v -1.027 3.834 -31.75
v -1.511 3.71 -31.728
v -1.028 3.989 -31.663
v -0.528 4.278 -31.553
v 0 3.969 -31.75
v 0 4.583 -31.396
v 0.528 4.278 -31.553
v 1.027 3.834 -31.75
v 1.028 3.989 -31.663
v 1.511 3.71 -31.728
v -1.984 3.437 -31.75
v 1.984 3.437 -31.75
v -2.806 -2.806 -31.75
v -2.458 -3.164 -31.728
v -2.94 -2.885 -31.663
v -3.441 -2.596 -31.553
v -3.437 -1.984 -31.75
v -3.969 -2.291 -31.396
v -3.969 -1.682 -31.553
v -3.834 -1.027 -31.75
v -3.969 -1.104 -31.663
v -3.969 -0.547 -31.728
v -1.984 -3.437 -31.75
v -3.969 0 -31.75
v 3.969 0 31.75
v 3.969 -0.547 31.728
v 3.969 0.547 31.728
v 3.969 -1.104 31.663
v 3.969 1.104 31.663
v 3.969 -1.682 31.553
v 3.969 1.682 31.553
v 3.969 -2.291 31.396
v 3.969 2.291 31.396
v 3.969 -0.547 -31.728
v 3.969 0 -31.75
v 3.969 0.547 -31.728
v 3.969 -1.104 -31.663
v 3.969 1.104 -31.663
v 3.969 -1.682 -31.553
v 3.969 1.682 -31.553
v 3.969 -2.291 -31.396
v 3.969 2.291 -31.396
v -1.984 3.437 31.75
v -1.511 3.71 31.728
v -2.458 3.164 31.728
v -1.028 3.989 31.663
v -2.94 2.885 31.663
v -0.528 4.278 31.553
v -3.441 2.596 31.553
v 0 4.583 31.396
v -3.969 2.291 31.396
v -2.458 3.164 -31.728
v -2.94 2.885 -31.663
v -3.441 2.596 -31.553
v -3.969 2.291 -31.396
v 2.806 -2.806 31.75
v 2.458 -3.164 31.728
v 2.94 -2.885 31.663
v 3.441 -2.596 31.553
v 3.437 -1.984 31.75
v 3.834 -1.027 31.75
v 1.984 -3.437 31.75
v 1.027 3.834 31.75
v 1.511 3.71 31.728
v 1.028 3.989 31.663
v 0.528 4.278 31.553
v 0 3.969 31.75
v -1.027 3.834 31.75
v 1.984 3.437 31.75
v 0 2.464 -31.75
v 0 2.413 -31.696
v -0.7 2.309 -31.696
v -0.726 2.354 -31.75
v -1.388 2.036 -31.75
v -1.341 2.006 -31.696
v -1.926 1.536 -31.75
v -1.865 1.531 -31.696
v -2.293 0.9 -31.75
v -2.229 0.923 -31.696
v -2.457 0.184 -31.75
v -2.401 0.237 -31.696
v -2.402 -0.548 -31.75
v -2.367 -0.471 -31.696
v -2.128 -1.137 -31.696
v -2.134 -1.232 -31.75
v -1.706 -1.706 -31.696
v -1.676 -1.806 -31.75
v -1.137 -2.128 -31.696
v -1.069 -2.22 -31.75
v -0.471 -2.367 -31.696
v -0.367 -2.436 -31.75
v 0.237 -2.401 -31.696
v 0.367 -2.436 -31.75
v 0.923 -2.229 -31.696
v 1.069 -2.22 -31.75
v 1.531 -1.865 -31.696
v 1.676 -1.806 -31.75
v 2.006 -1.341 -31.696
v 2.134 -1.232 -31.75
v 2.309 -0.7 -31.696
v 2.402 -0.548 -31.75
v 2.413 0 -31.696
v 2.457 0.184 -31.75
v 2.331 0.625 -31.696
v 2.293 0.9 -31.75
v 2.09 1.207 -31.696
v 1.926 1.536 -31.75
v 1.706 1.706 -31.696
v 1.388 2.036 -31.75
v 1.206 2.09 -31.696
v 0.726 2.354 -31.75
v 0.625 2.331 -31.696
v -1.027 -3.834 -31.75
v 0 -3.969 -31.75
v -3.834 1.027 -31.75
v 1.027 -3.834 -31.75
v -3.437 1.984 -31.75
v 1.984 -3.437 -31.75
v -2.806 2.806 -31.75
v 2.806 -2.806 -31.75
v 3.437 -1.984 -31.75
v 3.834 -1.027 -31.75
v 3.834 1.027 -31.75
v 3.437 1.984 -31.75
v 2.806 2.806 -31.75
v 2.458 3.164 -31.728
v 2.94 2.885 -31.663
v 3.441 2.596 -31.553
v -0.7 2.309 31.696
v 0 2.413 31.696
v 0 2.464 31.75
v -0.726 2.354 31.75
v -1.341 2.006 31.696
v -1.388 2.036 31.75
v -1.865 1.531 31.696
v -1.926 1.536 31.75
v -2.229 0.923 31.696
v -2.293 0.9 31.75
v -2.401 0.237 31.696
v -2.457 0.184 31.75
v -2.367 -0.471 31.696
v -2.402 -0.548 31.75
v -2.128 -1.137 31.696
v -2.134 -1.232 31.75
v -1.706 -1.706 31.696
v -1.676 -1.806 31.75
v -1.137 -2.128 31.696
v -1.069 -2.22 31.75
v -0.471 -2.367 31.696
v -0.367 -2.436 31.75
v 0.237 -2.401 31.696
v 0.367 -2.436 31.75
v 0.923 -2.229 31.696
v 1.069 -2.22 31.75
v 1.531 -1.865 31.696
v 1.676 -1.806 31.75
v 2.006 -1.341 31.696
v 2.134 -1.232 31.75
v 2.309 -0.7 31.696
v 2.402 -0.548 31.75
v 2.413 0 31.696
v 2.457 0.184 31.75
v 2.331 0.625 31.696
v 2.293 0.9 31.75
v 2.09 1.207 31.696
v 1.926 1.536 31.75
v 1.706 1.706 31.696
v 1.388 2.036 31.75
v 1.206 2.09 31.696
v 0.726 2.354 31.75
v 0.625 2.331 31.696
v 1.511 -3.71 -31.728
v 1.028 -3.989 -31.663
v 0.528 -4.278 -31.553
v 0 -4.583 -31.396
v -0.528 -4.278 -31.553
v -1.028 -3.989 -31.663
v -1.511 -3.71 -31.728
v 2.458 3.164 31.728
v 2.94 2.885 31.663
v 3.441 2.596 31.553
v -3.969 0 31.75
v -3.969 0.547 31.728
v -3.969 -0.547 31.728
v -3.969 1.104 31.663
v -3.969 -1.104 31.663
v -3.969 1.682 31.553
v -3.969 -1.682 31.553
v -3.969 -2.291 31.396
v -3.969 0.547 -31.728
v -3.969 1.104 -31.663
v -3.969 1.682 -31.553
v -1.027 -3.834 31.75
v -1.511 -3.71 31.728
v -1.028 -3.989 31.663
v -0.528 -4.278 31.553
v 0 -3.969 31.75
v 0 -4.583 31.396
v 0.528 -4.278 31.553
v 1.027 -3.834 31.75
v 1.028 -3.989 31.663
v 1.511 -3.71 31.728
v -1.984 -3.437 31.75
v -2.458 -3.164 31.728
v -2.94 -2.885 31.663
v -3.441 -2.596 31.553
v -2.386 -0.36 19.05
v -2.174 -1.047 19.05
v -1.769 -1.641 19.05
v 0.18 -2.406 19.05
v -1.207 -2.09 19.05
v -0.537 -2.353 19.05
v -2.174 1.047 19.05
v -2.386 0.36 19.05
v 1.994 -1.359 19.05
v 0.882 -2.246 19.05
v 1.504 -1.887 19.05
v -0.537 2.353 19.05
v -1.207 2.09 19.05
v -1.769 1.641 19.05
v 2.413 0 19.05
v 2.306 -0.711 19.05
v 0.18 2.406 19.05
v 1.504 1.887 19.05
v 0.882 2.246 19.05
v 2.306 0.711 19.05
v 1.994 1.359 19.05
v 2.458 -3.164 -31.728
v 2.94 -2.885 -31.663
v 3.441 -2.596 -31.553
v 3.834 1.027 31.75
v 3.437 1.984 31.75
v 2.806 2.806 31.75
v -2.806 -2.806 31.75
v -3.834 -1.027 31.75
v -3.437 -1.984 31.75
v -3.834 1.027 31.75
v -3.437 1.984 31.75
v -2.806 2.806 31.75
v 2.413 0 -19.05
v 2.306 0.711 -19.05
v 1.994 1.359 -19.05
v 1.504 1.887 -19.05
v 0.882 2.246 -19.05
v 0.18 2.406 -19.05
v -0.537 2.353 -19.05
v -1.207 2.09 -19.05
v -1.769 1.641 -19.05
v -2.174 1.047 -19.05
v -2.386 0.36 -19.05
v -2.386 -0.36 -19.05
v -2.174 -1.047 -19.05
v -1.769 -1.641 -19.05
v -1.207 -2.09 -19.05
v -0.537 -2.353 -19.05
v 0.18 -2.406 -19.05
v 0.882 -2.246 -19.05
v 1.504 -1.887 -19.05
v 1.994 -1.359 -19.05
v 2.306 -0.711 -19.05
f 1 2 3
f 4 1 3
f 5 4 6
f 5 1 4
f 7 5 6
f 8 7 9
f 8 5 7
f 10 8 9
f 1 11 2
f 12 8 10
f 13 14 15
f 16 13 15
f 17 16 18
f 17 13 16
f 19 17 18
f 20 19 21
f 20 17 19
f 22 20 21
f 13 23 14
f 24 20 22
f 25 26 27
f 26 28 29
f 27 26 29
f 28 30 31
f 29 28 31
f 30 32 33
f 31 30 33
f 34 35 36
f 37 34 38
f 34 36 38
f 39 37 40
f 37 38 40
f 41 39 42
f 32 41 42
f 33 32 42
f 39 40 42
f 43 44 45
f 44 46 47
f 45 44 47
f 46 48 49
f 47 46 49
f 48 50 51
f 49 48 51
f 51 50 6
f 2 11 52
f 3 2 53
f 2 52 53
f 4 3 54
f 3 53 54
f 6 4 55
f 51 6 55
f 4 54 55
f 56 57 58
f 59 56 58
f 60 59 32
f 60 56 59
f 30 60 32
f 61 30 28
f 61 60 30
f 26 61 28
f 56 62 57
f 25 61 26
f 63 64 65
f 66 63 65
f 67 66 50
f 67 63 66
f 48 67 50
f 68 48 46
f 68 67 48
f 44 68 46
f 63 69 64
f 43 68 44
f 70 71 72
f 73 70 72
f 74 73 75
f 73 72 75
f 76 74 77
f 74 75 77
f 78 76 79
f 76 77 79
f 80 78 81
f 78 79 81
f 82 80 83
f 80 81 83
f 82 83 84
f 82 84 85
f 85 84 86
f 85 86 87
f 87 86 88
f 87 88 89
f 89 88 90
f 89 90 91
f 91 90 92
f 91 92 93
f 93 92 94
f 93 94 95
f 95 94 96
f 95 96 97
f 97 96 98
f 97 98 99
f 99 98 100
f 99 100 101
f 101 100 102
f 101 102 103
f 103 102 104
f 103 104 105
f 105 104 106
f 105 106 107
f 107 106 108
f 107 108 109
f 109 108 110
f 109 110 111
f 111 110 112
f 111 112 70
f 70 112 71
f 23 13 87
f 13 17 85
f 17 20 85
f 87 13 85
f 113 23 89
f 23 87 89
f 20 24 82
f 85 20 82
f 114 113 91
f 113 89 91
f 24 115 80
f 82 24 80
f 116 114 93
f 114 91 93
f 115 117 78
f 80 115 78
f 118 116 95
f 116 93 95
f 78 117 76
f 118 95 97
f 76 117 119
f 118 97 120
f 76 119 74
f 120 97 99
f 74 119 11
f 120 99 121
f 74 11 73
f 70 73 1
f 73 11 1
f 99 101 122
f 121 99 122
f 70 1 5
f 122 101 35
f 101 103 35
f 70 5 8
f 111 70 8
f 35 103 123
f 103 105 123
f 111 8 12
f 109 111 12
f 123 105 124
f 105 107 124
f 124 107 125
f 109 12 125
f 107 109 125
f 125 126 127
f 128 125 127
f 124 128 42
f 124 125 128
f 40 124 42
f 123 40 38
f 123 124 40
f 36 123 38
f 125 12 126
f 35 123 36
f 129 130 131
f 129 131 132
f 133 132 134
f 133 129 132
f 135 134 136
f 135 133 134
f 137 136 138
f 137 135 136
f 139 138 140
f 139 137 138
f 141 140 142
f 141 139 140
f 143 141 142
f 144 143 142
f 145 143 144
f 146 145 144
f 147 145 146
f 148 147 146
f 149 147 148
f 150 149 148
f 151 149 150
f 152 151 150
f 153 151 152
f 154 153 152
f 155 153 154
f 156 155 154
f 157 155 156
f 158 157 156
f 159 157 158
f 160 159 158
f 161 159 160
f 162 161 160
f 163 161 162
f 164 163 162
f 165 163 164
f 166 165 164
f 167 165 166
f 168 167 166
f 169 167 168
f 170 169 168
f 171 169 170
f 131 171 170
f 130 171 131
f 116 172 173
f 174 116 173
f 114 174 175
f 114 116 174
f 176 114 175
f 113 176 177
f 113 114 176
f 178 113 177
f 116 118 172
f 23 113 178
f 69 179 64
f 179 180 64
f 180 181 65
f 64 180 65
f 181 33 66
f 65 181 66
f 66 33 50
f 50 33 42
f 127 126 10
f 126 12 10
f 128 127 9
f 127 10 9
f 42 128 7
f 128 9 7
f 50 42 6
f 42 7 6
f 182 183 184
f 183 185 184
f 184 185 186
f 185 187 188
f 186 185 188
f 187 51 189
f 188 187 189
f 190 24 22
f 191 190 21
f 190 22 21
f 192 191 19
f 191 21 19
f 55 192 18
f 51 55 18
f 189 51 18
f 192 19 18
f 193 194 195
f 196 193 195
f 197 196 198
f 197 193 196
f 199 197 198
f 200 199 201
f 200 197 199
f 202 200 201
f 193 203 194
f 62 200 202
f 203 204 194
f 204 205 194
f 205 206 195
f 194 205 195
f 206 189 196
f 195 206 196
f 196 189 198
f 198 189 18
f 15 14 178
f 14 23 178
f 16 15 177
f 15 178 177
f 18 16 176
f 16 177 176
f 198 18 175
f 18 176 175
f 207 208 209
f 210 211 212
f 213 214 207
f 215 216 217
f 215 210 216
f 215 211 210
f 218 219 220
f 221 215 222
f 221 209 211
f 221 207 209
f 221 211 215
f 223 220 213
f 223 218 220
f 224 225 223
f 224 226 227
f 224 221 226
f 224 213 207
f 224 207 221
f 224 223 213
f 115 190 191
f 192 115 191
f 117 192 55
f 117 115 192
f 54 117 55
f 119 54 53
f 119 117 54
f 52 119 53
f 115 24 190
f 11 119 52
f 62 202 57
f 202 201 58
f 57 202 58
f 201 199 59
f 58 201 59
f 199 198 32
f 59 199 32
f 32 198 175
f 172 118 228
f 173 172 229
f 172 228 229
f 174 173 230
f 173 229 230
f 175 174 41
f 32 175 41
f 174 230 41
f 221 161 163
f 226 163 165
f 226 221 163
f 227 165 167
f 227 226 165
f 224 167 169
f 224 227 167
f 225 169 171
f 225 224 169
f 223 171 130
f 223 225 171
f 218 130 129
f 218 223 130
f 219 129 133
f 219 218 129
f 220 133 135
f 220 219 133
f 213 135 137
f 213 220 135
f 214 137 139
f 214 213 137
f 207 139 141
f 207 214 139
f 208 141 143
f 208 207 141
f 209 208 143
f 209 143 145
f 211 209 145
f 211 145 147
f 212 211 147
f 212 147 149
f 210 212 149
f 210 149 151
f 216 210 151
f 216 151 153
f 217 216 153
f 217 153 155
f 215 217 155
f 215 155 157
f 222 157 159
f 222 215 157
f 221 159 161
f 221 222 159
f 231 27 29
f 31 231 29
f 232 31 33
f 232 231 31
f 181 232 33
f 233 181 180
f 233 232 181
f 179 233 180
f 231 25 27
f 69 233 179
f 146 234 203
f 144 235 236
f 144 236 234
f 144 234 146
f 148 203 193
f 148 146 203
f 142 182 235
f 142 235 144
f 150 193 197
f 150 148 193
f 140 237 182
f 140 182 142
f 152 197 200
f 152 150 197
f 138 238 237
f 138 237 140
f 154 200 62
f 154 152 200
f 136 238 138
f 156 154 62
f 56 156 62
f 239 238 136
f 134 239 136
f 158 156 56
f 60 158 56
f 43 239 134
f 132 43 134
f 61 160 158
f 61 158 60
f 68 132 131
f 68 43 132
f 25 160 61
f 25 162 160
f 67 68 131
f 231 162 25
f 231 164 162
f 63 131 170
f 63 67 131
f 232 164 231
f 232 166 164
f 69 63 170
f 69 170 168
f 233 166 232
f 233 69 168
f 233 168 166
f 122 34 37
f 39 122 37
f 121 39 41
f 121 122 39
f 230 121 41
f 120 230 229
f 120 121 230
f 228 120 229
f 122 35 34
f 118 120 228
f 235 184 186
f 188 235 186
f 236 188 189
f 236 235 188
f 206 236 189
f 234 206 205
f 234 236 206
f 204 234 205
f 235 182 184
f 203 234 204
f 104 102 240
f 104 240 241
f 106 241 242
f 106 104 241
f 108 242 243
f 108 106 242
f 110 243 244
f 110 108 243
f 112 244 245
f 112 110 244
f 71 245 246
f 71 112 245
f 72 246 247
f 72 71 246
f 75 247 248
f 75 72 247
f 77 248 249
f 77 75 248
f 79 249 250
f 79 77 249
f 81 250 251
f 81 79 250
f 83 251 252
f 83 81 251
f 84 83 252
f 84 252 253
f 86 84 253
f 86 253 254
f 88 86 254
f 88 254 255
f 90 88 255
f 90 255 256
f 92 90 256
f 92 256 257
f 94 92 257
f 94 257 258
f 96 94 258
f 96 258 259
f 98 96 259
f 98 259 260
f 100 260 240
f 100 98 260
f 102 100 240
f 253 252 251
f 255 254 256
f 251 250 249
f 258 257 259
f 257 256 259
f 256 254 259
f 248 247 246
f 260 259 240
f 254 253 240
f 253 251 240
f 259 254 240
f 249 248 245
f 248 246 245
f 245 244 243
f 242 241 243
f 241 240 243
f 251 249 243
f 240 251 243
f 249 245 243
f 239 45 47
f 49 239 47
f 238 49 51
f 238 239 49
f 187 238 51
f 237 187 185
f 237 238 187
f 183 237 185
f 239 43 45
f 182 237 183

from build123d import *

# Parameters (mm, degrees)
EXTRUDE1_DEPTH          = 31.75
EXTRUDE1_DEPTH_BACK     = 31.75
SKETCH1_R               = 2.413
SKETCH8_OUTSIDE_W       = 247.302
SKETCH8_OUTSIDE_H       = 248.53
SKETCH8_OUTSIDE_R       = 3.96875
EXTRUDE4_DEPTH          = 64.788731596
EXTRUDE4_DRAFT          = -60
MIRROR1_COPY_1_SKETCH_W = 247.302
MIRROR1_COPY_1_SKETCH_H = 248.53
MIRROR1_COPY_1_SKETCH_R = 3.96875
MIRROR1_COPY_1_DEPTH    = 64.788731596
MIRROR1_COPY_1_DRAFT    = -60
SKETCH9_W               = 38.1
SKETCH9_H               = 2.4638


with BuildPart() as part:
    # Sketch1 → Extrude1 (new, two sides: drawn at the far end of the back side and taken through both)
    with BuildSketch(Plane.XY.offset(-EXTRUDE1_DEPTH_BACK)):
        Polygon((0, 4.582717762), (-3.96875, 2.291358881), (-3.96875, -2.291358881), (0, -4.582717762), (3.96875, -2.291358881), (3.96875, 2.291358881), align=None)
        Circle(SKETCH1_R, mode=Mode.SUBTRACT)
    extrude(amount=EXTRUDE1_DEPTH + EXTRUDE1_DEPTH_BACK)

    # Extrude3 cone 1 section (through the dimple's axis) → Extrude3 (revolve, cut)
    with BuildSketch(Plane(origin=(0, 0, -31.75), x_dir=(0, 1, 0), z_dir=(1, 0, 0))):
        Polygon((0, 0), (2.4638, 0), (0, 2.642102028), align=None)
    extrude3 = revolve(axis=Axis((0, 0, -31.75), (0, 0, 1)), mode=Mode.SUBTRACT)


with BuildPart() as extrude4_tool:
    # Sketch8 outside → Extrude4 (with draft: the straight prism first)
    with BuildSketch(Plane(origin=(0, 0, -31.75), x_dir=(-1, 0, 0), z_dir=(0, 0, -1))):
        Rectangle(SKETCH8_OUTSIDE_W, SKETCH8_OUTSIDE_H)
        Circle(SKETCH8_OUTSIDE_R, mode=Mode.SUBTRACT)
    extrude(amount=-EXTRUDE4_DEPTH)
    # Extrude4: the draft: its side faces are tilted about the plane it starts from
    extrude4_sides = [extrude4_tool.faces().sort_by_distance(p)[0] for p in [
        (0, -124.265, 0.644365798),
        (-123.651, 0, 0.644365798),
        (0, 124.265, 0.644365798),
        (123.651, 0, 0.644365798),
        (3.96875, 0, 0.644365798),
    ]]
    draft(extrude4_sides, Plane(origin=(0, 0, -31.75), x_dir=(-1, 0, 0), z_dir=(0, 0, -1)), EXTRUDE4_DRAFT)


with BuildPart() as part_1:
    add(part.part)

    # Extrude4: cut by extrude4_tool
    add(extrude4_tool.part, mode=Mode.SUBTRACT)

    # Mirror1: Extrude3 across plane
    add(extrude3.mirror(Plane.XY), mode=Mode.SUBTRACT)


with BuildPart() as mirror1_copy_1_tool:
    # Mirror1 copy 1 sketch → Mirror1 copy 1 (with draft: the straight prism first)
    with BuildSketch(Plane(origin=(0, 0, 31.75), x_dir=(-1, 0, 0), z_dir=(0, 0, 1))):
        Rectangle(MIRROR1_COPY_1_SKETCH_W, MIRROR1_COPY_1_SKETCH_H)
        Circle(MIRROR1_COPY_1_SKETCH_R, mode=Mode.SUBTRACT)
    extrude(amount=-MIRROR1_COPY_1_DEPTH)
    # Mirror1 copy 1: the draft: its side faces are tilted about the plane it starts from
    mirror1_copy_1_sides = [mirror1_copy_1_tool.faces().sort_by_distance(p)[0] for p in [
        (0, -124.265, -0.644365798),
        (-123.651, 0, -0.644365798),
        (0, 124.265, -0.644365798),
        (123.651, 0, -0.644365798),
        (3.96875, 0, -0.644365798),
    ]]
    draft(mirror1_copy_1_sides, Plane(origin=(0, 0, 31.75), x_dir=(-1, 0, 0), z_dir=(0, 0, 1)), MIRROR1_COPY_1_DRAFT)


with BuildPart() as part_2:
    add(part_1.part)

    # Mirror1 copy 1: cut by mirror1_copy_1_tool
    add(mirror1_copy_1_tool.part, mode=Mode.SUBTRACT)

    # Sketch9 → Revolve 2 (revolve)
    with BuildSketch(Plane(origin=(0, 0, 0), x_dir=(0, 0, -1), z_dir=(1, 0, 0)), mode=Mode.PRIVATE) as revolve_2_sk:
        with Locations((0, 1.2319)):
            Rectangle(SKETCH9_W, SKETCH9_H)
    revolve(revolve_2_sk.sketch.rotate(Axis((0, 0, 31.75), (0, 0, -1)), 270), axis=Axis((0, 0, 31.75), (0, 0, -1)))


solid = part_2.part
